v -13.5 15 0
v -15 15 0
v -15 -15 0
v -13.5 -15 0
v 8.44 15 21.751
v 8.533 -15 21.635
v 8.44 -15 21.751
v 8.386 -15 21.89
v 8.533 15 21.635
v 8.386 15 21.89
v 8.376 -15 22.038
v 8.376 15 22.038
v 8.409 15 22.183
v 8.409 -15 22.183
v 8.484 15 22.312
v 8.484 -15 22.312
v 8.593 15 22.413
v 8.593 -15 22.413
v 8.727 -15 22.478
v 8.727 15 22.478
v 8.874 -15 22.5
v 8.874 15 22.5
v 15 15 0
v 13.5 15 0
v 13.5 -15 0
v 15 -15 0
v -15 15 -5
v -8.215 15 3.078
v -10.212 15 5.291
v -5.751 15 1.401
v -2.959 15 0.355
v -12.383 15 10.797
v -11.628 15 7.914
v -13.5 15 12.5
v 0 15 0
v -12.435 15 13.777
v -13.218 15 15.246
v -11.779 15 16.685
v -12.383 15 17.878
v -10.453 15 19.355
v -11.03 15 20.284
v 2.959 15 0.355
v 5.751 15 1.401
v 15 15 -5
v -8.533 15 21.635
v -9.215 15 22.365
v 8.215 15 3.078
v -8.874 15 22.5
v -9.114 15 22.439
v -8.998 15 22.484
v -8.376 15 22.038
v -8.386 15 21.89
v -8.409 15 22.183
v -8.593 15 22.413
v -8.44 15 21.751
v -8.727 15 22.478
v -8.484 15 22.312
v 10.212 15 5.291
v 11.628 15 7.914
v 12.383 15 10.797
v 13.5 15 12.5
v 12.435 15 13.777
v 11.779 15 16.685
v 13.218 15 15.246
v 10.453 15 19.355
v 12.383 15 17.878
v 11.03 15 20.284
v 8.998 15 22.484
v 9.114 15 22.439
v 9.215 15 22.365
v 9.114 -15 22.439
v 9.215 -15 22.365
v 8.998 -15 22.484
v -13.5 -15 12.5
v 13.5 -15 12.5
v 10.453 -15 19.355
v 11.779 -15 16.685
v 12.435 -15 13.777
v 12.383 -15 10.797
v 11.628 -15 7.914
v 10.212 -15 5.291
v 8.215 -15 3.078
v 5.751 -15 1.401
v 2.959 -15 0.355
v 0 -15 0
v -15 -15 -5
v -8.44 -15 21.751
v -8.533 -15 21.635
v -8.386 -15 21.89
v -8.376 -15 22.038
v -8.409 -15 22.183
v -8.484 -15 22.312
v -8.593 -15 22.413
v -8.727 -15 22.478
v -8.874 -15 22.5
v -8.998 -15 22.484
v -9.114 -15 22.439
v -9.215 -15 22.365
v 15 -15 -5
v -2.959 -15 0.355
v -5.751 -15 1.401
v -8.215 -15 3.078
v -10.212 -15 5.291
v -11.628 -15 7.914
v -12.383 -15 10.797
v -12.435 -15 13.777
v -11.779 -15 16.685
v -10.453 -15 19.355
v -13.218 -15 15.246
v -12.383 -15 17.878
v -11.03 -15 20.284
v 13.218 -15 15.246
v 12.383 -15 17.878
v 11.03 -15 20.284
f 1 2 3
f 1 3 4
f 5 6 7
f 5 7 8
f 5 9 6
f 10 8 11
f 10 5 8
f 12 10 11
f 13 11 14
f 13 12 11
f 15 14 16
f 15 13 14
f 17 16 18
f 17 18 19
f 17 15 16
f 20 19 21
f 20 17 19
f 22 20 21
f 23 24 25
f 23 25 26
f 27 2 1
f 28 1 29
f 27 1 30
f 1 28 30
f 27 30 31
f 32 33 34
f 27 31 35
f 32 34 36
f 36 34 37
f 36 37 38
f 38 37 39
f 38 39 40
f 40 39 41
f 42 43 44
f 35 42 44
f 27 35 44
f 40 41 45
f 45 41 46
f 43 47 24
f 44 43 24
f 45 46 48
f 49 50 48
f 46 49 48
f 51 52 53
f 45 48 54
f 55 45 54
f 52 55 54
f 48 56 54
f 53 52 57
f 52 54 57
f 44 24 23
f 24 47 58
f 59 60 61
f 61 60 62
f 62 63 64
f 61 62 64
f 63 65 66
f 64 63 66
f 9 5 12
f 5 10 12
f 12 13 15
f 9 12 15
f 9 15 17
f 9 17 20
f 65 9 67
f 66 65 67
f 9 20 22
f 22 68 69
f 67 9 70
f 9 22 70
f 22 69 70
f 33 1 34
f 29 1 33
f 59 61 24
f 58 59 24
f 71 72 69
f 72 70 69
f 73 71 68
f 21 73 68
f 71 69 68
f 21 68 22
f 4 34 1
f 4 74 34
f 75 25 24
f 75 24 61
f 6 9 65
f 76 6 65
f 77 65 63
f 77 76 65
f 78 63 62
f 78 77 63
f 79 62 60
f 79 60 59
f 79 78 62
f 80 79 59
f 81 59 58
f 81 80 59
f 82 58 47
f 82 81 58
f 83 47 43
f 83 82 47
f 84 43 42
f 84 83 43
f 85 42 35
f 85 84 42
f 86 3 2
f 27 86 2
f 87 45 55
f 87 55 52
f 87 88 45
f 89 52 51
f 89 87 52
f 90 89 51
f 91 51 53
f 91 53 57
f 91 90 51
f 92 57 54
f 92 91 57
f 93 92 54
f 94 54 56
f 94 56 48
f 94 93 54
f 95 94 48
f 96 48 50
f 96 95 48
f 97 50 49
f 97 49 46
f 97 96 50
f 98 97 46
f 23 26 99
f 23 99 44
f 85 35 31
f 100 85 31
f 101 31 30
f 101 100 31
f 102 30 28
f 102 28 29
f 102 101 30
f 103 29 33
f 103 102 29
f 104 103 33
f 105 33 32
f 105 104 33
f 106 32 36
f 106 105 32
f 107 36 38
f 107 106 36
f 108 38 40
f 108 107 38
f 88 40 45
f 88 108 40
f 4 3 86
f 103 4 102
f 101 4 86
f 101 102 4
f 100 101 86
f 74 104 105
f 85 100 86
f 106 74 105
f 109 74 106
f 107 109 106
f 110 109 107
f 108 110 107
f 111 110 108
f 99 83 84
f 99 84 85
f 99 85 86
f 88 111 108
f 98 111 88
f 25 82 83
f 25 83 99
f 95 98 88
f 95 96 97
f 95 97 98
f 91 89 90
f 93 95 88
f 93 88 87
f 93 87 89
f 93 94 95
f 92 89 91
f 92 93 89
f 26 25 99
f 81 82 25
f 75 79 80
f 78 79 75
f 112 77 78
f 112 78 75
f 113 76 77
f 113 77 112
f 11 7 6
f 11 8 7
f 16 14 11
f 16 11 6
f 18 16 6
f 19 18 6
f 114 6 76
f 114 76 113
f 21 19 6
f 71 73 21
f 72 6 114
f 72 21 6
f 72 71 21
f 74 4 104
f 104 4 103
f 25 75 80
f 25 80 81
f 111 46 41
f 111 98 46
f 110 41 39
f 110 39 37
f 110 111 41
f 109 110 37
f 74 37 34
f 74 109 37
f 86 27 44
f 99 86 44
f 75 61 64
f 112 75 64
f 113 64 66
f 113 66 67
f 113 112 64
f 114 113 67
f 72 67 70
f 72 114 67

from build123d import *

# Parameters (mm, degrees)
F1_W     = 30
F1_H     = 30
F2_DEPTH = 5
F3_DEPTH = 15
F4_R     = 0.49999


# Not quite as in the source:
# - a fillet or chamfer is up to 0.001 mm smaller than in the source, because OpenCascade refuses the exact size


with BuildPart() as f2:
    # F1 (on Top) → F2 (new body)
    with BuildSketch(Plane.XY):
        Rectangle(F1_W, F1_H)
    extrude(amount=-F2_DEPTH)

    # F0 (on Front) → F3 (join, symmetric)
    with BuildSketch(Plane.XZ):
        with BuildLine():
            ThreePointArc((0, 0), (-11.8585412256, 8.5471529248), (-7.5, 22.5))
            Line((-7.5, 22.5), (-9.0691785736, 22.5))
            ThreePointArc((-9.0691785736, 22.5), (-12.3426883365, 17.9688247941), (-13.5, 12.5))
            Line((-13.5, 12.5), (-13.5, 0))
            Line((-13.5, 0), (0, 0))
        make_face()
        with BuildLine():
            ThreePointArc((7.5, 22.5), (11.8585412256, 8.5471529248), (0, 0))
            Line((0, 0), (13.5, 0))
            Line((13.5, 0), (13.5, 12.5))
            ThreePointArc((13.5, 12.5), (12.3426883365, 17.9688247941), (9.0691785736, 22.5))
            Line((9.0691785736, 22.5), (7.5, 22.5))
        make_face()
    extrude(amount=F3_DEPTH, both=True)

    # F4 (radius 0.5 in the source; OpenCascade refuses exactly that, so slightly less here)
    f4_edges = [f2.edges().sort_by_distance(p)[0] for p in [
        (-7.5, 0, 22.5),
        (9.069179, 0, 22.5),
        (-9.069179, 0, 22.5),
        (7.5, 0, 22.5),
    ]]
    fillet(f4_edges, radius=F4_R)


solid = f2.part
